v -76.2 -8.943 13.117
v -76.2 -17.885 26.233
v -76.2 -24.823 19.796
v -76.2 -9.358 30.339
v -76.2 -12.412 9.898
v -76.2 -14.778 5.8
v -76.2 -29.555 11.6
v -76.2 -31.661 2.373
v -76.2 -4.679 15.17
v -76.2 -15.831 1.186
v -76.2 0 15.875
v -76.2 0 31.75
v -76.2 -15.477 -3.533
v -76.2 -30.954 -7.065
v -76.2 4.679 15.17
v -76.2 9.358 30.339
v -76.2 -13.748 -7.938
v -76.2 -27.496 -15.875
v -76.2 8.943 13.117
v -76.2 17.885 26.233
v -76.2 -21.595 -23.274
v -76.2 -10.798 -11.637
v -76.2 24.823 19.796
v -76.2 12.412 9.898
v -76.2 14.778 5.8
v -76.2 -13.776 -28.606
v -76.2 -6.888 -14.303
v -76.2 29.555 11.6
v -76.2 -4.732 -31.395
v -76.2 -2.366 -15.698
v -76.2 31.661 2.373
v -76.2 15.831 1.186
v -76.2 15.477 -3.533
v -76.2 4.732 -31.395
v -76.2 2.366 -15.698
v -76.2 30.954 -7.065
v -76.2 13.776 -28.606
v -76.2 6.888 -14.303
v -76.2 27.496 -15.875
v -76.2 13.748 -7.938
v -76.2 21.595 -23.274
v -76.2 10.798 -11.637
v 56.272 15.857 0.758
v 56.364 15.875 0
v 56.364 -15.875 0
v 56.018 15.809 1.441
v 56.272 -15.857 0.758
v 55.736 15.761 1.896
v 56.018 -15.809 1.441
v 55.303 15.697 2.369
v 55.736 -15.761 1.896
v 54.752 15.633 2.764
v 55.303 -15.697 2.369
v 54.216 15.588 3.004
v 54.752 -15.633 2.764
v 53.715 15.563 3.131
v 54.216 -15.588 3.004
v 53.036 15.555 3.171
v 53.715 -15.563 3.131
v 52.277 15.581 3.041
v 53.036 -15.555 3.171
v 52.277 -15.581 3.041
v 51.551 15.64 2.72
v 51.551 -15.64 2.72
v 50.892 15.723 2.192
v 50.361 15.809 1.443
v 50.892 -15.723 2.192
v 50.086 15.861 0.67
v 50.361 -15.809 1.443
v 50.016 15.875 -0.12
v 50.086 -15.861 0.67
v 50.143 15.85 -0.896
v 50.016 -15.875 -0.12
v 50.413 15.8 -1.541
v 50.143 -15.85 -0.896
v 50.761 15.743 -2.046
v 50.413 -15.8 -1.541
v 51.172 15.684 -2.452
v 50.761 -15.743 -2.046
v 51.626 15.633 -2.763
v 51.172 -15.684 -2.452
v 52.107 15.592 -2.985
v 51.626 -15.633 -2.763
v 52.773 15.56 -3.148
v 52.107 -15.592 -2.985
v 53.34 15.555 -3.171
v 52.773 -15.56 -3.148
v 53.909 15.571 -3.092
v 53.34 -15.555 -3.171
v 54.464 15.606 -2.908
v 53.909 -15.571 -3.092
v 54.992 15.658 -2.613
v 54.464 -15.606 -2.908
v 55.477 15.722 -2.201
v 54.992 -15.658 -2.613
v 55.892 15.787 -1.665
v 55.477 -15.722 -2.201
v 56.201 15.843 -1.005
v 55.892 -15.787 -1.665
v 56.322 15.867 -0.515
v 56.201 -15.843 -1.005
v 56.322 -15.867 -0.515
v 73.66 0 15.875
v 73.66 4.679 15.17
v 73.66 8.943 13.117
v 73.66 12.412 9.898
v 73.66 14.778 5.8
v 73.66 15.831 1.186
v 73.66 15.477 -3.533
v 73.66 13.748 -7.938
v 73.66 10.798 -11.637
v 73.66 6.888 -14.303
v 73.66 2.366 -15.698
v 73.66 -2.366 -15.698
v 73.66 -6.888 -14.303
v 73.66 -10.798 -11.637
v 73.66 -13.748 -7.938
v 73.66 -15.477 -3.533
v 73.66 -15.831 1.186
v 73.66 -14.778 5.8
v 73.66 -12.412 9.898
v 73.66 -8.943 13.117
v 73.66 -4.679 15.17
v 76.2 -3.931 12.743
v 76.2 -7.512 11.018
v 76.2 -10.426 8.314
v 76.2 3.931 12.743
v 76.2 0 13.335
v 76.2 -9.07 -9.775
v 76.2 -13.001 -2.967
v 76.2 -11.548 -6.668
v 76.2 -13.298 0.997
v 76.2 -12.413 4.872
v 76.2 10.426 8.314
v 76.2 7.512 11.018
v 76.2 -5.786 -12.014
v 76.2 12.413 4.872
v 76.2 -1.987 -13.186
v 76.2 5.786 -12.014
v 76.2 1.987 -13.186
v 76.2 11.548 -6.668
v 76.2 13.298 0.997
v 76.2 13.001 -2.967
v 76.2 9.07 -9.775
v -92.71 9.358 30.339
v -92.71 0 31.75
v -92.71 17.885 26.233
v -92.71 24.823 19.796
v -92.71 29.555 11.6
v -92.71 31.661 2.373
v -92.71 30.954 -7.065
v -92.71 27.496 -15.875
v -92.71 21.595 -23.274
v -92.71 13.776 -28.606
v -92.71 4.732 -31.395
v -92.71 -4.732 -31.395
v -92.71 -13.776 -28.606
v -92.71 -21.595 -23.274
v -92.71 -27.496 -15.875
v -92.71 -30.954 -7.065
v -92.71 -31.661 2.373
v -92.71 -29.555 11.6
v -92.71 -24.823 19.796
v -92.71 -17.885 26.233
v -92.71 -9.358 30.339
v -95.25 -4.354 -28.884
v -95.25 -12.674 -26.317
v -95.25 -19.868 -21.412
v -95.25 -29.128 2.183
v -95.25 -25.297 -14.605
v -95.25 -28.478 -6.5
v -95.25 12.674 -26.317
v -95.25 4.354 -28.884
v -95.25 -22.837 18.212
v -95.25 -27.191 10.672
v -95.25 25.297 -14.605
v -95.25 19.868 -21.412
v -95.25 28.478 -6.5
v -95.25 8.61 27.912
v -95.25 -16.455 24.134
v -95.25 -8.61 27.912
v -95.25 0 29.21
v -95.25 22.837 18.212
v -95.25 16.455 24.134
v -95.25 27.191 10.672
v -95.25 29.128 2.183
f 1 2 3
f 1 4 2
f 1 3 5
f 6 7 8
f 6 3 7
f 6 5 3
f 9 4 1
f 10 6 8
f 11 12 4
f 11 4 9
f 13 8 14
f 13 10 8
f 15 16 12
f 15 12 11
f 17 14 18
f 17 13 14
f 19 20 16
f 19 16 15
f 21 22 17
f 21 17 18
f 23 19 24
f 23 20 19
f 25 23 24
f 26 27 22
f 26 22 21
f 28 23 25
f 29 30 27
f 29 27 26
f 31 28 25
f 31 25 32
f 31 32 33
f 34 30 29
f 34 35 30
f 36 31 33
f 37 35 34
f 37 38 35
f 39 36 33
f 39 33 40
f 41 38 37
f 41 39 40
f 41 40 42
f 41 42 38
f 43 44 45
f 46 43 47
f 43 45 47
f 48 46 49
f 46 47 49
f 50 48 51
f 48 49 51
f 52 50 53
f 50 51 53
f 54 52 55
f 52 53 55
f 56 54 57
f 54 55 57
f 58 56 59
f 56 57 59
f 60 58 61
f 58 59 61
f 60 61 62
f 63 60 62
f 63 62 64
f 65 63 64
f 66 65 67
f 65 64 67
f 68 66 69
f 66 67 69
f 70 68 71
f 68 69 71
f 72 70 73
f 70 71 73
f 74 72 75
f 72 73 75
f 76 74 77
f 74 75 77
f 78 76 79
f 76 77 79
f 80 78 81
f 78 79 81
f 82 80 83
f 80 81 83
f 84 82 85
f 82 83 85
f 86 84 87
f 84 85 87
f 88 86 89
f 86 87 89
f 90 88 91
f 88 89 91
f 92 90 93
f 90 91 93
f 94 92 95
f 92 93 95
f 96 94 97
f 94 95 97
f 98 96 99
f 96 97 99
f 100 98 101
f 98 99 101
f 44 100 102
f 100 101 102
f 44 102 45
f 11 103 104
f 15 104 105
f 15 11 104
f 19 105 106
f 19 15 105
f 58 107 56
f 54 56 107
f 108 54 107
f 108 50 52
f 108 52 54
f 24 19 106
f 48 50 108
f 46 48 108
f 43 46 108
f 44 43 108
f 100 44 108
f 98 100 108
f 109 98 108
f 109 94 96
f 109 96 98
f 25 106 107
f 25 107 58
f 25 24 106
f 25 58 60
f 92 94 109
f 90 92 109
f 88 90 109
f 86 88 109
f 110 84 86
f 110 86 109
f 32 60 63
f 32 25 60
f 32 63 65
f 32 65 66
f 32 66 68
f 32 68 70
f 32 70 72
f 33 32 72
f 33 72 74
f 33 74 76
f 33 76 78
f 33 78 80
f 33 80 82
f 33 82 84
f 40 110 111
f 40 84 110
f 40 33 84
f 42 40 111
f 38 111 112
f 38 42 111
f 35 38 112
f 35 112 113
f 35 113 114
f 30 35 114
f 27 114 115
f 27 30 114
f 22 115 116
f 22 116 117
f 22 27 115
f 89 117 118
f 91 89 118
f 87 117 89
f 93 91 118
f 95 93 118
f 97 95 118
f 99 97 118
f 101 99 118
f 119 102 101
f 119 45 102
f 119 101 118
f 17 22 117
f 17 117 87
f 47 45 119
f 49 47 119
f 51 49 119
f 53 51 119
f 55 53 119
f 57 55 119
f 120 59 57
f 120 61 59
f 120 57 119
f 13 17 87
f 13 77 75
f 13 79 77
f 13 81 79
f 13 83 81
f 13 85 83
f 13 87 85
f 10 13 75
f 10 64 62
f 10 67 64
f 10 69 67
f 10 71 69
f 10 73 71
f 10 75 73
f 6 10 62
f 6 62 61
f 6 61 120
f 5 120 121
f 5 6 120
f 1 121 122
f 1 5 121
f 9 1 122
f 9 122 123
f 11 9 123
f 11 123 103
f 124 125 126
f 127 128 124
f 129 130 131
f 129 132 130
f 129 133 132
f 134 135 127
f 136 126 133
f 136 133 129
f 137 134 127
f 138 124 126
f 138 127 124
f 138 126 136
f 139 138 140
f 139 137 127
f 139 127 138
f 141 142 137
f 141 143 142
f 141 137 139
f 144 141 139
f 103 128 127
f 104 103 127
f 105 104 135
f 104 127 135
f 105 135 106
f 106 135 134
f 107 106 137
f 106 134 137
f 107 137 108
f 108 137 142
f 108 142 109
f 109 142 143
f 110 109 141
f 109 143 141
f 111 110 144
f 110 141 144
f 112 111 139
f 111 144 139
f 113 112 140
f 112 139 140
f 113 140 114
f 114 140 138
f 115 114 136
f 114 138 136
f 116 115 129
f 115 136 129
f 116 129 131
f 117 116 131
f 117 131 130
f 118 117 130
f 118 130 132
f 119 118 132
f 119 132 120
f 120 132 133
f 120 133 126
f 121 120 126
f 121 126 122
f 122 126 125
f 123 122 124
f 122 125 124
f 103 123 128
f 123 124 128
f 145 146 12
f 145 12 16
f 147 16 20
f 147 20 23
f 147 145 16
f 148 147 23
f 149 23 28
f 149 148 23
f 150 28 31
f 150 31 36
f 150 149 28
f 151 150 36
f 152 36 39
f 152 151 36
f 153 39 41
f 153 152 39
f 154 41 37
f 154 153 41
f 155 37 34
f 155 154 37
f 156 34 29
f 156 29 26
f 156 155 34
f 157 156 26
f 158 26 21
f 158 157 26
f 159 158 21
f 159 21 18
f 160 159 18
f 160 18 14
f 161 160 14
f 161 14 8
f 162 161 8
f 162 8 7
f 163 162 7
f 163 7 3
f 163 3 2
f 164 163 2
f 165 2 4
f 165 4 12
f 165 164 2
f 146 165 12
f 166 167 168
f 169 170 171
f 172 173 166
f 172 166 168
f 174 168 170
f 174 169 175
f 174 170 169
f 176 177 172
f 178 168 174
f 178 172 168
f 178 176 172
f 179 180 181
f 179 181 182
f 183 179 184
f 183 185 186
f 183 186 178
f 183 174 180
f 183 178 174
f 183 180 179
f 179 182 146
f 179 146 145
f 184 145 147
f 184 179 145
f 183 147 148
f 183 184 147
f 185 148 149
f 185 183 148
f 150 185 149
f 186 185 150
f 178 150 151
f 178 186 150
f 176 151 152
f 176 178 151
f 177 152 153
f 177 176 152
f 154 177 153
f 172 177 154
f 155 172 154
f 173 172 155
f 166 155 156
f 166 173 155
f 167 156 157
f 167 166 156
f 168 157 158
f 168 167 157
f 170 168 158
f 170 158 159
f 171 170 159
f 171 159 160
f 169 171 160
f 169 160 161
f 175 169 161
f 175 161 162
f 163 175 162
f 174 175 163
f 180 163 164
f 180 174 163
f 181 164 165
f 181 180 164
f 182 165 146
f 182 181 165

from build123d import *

# Parameters (mm, degrees)
F2_DEPTH = 25.4
F3_SIZE  = 2.54


with BuildPart() as f1:
    # F0 (on Front) → F1 (revolve)
    with BuildSketch(Plane.XZ):
        with BuildLine():
            Line((-76.2, 15.875), (-76.2, 0))
            Line((-76.2, 0), (50.0140764832, 0))
            ThreePointArc((50.0140764832, 0), (53.1890764832, 3.175), (56.3640764832, 0))
            Line((56.3640764832, 0), (76.2, 0))
            Line((76.2, 0), (76.2, 15.875))
            Line((76.2, 15.875), (-76.2, 15.875))
        make_face()
        Polygon((-95.25, 0), (-76.2, 0), (-76.2, 15.875), (-76.2, 31.75), (-95.25, 31.75), align=None)
    revolve(axis=Axis((-9.525, 0, 0), (-1, 0, 0)))

    # F0 (on Front) → F2 (cut, symmetric)
    with BuildSketch(Plane.XZ):
        with BuildLine():
            Line((56.3640764832, 0), (50.0140764832, 0))
            ThreePointArc((50.0140764832, 0), (53.1890764832, -3.175), (56.3640764832, 0))
        make_face()
        with BuildLine():
            ThreePointArc((56.3640764832, 0), (53.1890764832, 3.175), (50.0140764832, 0))
            Line((50.0140764832, 0), (56.3640764832, 0))
        make_face()
    extrude(amount=F2_DEPTH, both=True, mode=Mode.SUBTRACT)

    # F3
    f3_edges = [f1.edges().sort_by_distance(p)[0] for p in [
        (76.2, 0, -15.875),
        (-95.25, 0, -31.75),
    ]]
    chamfer(f3_edges, length=F3_SIZE)


solid = f1.part
